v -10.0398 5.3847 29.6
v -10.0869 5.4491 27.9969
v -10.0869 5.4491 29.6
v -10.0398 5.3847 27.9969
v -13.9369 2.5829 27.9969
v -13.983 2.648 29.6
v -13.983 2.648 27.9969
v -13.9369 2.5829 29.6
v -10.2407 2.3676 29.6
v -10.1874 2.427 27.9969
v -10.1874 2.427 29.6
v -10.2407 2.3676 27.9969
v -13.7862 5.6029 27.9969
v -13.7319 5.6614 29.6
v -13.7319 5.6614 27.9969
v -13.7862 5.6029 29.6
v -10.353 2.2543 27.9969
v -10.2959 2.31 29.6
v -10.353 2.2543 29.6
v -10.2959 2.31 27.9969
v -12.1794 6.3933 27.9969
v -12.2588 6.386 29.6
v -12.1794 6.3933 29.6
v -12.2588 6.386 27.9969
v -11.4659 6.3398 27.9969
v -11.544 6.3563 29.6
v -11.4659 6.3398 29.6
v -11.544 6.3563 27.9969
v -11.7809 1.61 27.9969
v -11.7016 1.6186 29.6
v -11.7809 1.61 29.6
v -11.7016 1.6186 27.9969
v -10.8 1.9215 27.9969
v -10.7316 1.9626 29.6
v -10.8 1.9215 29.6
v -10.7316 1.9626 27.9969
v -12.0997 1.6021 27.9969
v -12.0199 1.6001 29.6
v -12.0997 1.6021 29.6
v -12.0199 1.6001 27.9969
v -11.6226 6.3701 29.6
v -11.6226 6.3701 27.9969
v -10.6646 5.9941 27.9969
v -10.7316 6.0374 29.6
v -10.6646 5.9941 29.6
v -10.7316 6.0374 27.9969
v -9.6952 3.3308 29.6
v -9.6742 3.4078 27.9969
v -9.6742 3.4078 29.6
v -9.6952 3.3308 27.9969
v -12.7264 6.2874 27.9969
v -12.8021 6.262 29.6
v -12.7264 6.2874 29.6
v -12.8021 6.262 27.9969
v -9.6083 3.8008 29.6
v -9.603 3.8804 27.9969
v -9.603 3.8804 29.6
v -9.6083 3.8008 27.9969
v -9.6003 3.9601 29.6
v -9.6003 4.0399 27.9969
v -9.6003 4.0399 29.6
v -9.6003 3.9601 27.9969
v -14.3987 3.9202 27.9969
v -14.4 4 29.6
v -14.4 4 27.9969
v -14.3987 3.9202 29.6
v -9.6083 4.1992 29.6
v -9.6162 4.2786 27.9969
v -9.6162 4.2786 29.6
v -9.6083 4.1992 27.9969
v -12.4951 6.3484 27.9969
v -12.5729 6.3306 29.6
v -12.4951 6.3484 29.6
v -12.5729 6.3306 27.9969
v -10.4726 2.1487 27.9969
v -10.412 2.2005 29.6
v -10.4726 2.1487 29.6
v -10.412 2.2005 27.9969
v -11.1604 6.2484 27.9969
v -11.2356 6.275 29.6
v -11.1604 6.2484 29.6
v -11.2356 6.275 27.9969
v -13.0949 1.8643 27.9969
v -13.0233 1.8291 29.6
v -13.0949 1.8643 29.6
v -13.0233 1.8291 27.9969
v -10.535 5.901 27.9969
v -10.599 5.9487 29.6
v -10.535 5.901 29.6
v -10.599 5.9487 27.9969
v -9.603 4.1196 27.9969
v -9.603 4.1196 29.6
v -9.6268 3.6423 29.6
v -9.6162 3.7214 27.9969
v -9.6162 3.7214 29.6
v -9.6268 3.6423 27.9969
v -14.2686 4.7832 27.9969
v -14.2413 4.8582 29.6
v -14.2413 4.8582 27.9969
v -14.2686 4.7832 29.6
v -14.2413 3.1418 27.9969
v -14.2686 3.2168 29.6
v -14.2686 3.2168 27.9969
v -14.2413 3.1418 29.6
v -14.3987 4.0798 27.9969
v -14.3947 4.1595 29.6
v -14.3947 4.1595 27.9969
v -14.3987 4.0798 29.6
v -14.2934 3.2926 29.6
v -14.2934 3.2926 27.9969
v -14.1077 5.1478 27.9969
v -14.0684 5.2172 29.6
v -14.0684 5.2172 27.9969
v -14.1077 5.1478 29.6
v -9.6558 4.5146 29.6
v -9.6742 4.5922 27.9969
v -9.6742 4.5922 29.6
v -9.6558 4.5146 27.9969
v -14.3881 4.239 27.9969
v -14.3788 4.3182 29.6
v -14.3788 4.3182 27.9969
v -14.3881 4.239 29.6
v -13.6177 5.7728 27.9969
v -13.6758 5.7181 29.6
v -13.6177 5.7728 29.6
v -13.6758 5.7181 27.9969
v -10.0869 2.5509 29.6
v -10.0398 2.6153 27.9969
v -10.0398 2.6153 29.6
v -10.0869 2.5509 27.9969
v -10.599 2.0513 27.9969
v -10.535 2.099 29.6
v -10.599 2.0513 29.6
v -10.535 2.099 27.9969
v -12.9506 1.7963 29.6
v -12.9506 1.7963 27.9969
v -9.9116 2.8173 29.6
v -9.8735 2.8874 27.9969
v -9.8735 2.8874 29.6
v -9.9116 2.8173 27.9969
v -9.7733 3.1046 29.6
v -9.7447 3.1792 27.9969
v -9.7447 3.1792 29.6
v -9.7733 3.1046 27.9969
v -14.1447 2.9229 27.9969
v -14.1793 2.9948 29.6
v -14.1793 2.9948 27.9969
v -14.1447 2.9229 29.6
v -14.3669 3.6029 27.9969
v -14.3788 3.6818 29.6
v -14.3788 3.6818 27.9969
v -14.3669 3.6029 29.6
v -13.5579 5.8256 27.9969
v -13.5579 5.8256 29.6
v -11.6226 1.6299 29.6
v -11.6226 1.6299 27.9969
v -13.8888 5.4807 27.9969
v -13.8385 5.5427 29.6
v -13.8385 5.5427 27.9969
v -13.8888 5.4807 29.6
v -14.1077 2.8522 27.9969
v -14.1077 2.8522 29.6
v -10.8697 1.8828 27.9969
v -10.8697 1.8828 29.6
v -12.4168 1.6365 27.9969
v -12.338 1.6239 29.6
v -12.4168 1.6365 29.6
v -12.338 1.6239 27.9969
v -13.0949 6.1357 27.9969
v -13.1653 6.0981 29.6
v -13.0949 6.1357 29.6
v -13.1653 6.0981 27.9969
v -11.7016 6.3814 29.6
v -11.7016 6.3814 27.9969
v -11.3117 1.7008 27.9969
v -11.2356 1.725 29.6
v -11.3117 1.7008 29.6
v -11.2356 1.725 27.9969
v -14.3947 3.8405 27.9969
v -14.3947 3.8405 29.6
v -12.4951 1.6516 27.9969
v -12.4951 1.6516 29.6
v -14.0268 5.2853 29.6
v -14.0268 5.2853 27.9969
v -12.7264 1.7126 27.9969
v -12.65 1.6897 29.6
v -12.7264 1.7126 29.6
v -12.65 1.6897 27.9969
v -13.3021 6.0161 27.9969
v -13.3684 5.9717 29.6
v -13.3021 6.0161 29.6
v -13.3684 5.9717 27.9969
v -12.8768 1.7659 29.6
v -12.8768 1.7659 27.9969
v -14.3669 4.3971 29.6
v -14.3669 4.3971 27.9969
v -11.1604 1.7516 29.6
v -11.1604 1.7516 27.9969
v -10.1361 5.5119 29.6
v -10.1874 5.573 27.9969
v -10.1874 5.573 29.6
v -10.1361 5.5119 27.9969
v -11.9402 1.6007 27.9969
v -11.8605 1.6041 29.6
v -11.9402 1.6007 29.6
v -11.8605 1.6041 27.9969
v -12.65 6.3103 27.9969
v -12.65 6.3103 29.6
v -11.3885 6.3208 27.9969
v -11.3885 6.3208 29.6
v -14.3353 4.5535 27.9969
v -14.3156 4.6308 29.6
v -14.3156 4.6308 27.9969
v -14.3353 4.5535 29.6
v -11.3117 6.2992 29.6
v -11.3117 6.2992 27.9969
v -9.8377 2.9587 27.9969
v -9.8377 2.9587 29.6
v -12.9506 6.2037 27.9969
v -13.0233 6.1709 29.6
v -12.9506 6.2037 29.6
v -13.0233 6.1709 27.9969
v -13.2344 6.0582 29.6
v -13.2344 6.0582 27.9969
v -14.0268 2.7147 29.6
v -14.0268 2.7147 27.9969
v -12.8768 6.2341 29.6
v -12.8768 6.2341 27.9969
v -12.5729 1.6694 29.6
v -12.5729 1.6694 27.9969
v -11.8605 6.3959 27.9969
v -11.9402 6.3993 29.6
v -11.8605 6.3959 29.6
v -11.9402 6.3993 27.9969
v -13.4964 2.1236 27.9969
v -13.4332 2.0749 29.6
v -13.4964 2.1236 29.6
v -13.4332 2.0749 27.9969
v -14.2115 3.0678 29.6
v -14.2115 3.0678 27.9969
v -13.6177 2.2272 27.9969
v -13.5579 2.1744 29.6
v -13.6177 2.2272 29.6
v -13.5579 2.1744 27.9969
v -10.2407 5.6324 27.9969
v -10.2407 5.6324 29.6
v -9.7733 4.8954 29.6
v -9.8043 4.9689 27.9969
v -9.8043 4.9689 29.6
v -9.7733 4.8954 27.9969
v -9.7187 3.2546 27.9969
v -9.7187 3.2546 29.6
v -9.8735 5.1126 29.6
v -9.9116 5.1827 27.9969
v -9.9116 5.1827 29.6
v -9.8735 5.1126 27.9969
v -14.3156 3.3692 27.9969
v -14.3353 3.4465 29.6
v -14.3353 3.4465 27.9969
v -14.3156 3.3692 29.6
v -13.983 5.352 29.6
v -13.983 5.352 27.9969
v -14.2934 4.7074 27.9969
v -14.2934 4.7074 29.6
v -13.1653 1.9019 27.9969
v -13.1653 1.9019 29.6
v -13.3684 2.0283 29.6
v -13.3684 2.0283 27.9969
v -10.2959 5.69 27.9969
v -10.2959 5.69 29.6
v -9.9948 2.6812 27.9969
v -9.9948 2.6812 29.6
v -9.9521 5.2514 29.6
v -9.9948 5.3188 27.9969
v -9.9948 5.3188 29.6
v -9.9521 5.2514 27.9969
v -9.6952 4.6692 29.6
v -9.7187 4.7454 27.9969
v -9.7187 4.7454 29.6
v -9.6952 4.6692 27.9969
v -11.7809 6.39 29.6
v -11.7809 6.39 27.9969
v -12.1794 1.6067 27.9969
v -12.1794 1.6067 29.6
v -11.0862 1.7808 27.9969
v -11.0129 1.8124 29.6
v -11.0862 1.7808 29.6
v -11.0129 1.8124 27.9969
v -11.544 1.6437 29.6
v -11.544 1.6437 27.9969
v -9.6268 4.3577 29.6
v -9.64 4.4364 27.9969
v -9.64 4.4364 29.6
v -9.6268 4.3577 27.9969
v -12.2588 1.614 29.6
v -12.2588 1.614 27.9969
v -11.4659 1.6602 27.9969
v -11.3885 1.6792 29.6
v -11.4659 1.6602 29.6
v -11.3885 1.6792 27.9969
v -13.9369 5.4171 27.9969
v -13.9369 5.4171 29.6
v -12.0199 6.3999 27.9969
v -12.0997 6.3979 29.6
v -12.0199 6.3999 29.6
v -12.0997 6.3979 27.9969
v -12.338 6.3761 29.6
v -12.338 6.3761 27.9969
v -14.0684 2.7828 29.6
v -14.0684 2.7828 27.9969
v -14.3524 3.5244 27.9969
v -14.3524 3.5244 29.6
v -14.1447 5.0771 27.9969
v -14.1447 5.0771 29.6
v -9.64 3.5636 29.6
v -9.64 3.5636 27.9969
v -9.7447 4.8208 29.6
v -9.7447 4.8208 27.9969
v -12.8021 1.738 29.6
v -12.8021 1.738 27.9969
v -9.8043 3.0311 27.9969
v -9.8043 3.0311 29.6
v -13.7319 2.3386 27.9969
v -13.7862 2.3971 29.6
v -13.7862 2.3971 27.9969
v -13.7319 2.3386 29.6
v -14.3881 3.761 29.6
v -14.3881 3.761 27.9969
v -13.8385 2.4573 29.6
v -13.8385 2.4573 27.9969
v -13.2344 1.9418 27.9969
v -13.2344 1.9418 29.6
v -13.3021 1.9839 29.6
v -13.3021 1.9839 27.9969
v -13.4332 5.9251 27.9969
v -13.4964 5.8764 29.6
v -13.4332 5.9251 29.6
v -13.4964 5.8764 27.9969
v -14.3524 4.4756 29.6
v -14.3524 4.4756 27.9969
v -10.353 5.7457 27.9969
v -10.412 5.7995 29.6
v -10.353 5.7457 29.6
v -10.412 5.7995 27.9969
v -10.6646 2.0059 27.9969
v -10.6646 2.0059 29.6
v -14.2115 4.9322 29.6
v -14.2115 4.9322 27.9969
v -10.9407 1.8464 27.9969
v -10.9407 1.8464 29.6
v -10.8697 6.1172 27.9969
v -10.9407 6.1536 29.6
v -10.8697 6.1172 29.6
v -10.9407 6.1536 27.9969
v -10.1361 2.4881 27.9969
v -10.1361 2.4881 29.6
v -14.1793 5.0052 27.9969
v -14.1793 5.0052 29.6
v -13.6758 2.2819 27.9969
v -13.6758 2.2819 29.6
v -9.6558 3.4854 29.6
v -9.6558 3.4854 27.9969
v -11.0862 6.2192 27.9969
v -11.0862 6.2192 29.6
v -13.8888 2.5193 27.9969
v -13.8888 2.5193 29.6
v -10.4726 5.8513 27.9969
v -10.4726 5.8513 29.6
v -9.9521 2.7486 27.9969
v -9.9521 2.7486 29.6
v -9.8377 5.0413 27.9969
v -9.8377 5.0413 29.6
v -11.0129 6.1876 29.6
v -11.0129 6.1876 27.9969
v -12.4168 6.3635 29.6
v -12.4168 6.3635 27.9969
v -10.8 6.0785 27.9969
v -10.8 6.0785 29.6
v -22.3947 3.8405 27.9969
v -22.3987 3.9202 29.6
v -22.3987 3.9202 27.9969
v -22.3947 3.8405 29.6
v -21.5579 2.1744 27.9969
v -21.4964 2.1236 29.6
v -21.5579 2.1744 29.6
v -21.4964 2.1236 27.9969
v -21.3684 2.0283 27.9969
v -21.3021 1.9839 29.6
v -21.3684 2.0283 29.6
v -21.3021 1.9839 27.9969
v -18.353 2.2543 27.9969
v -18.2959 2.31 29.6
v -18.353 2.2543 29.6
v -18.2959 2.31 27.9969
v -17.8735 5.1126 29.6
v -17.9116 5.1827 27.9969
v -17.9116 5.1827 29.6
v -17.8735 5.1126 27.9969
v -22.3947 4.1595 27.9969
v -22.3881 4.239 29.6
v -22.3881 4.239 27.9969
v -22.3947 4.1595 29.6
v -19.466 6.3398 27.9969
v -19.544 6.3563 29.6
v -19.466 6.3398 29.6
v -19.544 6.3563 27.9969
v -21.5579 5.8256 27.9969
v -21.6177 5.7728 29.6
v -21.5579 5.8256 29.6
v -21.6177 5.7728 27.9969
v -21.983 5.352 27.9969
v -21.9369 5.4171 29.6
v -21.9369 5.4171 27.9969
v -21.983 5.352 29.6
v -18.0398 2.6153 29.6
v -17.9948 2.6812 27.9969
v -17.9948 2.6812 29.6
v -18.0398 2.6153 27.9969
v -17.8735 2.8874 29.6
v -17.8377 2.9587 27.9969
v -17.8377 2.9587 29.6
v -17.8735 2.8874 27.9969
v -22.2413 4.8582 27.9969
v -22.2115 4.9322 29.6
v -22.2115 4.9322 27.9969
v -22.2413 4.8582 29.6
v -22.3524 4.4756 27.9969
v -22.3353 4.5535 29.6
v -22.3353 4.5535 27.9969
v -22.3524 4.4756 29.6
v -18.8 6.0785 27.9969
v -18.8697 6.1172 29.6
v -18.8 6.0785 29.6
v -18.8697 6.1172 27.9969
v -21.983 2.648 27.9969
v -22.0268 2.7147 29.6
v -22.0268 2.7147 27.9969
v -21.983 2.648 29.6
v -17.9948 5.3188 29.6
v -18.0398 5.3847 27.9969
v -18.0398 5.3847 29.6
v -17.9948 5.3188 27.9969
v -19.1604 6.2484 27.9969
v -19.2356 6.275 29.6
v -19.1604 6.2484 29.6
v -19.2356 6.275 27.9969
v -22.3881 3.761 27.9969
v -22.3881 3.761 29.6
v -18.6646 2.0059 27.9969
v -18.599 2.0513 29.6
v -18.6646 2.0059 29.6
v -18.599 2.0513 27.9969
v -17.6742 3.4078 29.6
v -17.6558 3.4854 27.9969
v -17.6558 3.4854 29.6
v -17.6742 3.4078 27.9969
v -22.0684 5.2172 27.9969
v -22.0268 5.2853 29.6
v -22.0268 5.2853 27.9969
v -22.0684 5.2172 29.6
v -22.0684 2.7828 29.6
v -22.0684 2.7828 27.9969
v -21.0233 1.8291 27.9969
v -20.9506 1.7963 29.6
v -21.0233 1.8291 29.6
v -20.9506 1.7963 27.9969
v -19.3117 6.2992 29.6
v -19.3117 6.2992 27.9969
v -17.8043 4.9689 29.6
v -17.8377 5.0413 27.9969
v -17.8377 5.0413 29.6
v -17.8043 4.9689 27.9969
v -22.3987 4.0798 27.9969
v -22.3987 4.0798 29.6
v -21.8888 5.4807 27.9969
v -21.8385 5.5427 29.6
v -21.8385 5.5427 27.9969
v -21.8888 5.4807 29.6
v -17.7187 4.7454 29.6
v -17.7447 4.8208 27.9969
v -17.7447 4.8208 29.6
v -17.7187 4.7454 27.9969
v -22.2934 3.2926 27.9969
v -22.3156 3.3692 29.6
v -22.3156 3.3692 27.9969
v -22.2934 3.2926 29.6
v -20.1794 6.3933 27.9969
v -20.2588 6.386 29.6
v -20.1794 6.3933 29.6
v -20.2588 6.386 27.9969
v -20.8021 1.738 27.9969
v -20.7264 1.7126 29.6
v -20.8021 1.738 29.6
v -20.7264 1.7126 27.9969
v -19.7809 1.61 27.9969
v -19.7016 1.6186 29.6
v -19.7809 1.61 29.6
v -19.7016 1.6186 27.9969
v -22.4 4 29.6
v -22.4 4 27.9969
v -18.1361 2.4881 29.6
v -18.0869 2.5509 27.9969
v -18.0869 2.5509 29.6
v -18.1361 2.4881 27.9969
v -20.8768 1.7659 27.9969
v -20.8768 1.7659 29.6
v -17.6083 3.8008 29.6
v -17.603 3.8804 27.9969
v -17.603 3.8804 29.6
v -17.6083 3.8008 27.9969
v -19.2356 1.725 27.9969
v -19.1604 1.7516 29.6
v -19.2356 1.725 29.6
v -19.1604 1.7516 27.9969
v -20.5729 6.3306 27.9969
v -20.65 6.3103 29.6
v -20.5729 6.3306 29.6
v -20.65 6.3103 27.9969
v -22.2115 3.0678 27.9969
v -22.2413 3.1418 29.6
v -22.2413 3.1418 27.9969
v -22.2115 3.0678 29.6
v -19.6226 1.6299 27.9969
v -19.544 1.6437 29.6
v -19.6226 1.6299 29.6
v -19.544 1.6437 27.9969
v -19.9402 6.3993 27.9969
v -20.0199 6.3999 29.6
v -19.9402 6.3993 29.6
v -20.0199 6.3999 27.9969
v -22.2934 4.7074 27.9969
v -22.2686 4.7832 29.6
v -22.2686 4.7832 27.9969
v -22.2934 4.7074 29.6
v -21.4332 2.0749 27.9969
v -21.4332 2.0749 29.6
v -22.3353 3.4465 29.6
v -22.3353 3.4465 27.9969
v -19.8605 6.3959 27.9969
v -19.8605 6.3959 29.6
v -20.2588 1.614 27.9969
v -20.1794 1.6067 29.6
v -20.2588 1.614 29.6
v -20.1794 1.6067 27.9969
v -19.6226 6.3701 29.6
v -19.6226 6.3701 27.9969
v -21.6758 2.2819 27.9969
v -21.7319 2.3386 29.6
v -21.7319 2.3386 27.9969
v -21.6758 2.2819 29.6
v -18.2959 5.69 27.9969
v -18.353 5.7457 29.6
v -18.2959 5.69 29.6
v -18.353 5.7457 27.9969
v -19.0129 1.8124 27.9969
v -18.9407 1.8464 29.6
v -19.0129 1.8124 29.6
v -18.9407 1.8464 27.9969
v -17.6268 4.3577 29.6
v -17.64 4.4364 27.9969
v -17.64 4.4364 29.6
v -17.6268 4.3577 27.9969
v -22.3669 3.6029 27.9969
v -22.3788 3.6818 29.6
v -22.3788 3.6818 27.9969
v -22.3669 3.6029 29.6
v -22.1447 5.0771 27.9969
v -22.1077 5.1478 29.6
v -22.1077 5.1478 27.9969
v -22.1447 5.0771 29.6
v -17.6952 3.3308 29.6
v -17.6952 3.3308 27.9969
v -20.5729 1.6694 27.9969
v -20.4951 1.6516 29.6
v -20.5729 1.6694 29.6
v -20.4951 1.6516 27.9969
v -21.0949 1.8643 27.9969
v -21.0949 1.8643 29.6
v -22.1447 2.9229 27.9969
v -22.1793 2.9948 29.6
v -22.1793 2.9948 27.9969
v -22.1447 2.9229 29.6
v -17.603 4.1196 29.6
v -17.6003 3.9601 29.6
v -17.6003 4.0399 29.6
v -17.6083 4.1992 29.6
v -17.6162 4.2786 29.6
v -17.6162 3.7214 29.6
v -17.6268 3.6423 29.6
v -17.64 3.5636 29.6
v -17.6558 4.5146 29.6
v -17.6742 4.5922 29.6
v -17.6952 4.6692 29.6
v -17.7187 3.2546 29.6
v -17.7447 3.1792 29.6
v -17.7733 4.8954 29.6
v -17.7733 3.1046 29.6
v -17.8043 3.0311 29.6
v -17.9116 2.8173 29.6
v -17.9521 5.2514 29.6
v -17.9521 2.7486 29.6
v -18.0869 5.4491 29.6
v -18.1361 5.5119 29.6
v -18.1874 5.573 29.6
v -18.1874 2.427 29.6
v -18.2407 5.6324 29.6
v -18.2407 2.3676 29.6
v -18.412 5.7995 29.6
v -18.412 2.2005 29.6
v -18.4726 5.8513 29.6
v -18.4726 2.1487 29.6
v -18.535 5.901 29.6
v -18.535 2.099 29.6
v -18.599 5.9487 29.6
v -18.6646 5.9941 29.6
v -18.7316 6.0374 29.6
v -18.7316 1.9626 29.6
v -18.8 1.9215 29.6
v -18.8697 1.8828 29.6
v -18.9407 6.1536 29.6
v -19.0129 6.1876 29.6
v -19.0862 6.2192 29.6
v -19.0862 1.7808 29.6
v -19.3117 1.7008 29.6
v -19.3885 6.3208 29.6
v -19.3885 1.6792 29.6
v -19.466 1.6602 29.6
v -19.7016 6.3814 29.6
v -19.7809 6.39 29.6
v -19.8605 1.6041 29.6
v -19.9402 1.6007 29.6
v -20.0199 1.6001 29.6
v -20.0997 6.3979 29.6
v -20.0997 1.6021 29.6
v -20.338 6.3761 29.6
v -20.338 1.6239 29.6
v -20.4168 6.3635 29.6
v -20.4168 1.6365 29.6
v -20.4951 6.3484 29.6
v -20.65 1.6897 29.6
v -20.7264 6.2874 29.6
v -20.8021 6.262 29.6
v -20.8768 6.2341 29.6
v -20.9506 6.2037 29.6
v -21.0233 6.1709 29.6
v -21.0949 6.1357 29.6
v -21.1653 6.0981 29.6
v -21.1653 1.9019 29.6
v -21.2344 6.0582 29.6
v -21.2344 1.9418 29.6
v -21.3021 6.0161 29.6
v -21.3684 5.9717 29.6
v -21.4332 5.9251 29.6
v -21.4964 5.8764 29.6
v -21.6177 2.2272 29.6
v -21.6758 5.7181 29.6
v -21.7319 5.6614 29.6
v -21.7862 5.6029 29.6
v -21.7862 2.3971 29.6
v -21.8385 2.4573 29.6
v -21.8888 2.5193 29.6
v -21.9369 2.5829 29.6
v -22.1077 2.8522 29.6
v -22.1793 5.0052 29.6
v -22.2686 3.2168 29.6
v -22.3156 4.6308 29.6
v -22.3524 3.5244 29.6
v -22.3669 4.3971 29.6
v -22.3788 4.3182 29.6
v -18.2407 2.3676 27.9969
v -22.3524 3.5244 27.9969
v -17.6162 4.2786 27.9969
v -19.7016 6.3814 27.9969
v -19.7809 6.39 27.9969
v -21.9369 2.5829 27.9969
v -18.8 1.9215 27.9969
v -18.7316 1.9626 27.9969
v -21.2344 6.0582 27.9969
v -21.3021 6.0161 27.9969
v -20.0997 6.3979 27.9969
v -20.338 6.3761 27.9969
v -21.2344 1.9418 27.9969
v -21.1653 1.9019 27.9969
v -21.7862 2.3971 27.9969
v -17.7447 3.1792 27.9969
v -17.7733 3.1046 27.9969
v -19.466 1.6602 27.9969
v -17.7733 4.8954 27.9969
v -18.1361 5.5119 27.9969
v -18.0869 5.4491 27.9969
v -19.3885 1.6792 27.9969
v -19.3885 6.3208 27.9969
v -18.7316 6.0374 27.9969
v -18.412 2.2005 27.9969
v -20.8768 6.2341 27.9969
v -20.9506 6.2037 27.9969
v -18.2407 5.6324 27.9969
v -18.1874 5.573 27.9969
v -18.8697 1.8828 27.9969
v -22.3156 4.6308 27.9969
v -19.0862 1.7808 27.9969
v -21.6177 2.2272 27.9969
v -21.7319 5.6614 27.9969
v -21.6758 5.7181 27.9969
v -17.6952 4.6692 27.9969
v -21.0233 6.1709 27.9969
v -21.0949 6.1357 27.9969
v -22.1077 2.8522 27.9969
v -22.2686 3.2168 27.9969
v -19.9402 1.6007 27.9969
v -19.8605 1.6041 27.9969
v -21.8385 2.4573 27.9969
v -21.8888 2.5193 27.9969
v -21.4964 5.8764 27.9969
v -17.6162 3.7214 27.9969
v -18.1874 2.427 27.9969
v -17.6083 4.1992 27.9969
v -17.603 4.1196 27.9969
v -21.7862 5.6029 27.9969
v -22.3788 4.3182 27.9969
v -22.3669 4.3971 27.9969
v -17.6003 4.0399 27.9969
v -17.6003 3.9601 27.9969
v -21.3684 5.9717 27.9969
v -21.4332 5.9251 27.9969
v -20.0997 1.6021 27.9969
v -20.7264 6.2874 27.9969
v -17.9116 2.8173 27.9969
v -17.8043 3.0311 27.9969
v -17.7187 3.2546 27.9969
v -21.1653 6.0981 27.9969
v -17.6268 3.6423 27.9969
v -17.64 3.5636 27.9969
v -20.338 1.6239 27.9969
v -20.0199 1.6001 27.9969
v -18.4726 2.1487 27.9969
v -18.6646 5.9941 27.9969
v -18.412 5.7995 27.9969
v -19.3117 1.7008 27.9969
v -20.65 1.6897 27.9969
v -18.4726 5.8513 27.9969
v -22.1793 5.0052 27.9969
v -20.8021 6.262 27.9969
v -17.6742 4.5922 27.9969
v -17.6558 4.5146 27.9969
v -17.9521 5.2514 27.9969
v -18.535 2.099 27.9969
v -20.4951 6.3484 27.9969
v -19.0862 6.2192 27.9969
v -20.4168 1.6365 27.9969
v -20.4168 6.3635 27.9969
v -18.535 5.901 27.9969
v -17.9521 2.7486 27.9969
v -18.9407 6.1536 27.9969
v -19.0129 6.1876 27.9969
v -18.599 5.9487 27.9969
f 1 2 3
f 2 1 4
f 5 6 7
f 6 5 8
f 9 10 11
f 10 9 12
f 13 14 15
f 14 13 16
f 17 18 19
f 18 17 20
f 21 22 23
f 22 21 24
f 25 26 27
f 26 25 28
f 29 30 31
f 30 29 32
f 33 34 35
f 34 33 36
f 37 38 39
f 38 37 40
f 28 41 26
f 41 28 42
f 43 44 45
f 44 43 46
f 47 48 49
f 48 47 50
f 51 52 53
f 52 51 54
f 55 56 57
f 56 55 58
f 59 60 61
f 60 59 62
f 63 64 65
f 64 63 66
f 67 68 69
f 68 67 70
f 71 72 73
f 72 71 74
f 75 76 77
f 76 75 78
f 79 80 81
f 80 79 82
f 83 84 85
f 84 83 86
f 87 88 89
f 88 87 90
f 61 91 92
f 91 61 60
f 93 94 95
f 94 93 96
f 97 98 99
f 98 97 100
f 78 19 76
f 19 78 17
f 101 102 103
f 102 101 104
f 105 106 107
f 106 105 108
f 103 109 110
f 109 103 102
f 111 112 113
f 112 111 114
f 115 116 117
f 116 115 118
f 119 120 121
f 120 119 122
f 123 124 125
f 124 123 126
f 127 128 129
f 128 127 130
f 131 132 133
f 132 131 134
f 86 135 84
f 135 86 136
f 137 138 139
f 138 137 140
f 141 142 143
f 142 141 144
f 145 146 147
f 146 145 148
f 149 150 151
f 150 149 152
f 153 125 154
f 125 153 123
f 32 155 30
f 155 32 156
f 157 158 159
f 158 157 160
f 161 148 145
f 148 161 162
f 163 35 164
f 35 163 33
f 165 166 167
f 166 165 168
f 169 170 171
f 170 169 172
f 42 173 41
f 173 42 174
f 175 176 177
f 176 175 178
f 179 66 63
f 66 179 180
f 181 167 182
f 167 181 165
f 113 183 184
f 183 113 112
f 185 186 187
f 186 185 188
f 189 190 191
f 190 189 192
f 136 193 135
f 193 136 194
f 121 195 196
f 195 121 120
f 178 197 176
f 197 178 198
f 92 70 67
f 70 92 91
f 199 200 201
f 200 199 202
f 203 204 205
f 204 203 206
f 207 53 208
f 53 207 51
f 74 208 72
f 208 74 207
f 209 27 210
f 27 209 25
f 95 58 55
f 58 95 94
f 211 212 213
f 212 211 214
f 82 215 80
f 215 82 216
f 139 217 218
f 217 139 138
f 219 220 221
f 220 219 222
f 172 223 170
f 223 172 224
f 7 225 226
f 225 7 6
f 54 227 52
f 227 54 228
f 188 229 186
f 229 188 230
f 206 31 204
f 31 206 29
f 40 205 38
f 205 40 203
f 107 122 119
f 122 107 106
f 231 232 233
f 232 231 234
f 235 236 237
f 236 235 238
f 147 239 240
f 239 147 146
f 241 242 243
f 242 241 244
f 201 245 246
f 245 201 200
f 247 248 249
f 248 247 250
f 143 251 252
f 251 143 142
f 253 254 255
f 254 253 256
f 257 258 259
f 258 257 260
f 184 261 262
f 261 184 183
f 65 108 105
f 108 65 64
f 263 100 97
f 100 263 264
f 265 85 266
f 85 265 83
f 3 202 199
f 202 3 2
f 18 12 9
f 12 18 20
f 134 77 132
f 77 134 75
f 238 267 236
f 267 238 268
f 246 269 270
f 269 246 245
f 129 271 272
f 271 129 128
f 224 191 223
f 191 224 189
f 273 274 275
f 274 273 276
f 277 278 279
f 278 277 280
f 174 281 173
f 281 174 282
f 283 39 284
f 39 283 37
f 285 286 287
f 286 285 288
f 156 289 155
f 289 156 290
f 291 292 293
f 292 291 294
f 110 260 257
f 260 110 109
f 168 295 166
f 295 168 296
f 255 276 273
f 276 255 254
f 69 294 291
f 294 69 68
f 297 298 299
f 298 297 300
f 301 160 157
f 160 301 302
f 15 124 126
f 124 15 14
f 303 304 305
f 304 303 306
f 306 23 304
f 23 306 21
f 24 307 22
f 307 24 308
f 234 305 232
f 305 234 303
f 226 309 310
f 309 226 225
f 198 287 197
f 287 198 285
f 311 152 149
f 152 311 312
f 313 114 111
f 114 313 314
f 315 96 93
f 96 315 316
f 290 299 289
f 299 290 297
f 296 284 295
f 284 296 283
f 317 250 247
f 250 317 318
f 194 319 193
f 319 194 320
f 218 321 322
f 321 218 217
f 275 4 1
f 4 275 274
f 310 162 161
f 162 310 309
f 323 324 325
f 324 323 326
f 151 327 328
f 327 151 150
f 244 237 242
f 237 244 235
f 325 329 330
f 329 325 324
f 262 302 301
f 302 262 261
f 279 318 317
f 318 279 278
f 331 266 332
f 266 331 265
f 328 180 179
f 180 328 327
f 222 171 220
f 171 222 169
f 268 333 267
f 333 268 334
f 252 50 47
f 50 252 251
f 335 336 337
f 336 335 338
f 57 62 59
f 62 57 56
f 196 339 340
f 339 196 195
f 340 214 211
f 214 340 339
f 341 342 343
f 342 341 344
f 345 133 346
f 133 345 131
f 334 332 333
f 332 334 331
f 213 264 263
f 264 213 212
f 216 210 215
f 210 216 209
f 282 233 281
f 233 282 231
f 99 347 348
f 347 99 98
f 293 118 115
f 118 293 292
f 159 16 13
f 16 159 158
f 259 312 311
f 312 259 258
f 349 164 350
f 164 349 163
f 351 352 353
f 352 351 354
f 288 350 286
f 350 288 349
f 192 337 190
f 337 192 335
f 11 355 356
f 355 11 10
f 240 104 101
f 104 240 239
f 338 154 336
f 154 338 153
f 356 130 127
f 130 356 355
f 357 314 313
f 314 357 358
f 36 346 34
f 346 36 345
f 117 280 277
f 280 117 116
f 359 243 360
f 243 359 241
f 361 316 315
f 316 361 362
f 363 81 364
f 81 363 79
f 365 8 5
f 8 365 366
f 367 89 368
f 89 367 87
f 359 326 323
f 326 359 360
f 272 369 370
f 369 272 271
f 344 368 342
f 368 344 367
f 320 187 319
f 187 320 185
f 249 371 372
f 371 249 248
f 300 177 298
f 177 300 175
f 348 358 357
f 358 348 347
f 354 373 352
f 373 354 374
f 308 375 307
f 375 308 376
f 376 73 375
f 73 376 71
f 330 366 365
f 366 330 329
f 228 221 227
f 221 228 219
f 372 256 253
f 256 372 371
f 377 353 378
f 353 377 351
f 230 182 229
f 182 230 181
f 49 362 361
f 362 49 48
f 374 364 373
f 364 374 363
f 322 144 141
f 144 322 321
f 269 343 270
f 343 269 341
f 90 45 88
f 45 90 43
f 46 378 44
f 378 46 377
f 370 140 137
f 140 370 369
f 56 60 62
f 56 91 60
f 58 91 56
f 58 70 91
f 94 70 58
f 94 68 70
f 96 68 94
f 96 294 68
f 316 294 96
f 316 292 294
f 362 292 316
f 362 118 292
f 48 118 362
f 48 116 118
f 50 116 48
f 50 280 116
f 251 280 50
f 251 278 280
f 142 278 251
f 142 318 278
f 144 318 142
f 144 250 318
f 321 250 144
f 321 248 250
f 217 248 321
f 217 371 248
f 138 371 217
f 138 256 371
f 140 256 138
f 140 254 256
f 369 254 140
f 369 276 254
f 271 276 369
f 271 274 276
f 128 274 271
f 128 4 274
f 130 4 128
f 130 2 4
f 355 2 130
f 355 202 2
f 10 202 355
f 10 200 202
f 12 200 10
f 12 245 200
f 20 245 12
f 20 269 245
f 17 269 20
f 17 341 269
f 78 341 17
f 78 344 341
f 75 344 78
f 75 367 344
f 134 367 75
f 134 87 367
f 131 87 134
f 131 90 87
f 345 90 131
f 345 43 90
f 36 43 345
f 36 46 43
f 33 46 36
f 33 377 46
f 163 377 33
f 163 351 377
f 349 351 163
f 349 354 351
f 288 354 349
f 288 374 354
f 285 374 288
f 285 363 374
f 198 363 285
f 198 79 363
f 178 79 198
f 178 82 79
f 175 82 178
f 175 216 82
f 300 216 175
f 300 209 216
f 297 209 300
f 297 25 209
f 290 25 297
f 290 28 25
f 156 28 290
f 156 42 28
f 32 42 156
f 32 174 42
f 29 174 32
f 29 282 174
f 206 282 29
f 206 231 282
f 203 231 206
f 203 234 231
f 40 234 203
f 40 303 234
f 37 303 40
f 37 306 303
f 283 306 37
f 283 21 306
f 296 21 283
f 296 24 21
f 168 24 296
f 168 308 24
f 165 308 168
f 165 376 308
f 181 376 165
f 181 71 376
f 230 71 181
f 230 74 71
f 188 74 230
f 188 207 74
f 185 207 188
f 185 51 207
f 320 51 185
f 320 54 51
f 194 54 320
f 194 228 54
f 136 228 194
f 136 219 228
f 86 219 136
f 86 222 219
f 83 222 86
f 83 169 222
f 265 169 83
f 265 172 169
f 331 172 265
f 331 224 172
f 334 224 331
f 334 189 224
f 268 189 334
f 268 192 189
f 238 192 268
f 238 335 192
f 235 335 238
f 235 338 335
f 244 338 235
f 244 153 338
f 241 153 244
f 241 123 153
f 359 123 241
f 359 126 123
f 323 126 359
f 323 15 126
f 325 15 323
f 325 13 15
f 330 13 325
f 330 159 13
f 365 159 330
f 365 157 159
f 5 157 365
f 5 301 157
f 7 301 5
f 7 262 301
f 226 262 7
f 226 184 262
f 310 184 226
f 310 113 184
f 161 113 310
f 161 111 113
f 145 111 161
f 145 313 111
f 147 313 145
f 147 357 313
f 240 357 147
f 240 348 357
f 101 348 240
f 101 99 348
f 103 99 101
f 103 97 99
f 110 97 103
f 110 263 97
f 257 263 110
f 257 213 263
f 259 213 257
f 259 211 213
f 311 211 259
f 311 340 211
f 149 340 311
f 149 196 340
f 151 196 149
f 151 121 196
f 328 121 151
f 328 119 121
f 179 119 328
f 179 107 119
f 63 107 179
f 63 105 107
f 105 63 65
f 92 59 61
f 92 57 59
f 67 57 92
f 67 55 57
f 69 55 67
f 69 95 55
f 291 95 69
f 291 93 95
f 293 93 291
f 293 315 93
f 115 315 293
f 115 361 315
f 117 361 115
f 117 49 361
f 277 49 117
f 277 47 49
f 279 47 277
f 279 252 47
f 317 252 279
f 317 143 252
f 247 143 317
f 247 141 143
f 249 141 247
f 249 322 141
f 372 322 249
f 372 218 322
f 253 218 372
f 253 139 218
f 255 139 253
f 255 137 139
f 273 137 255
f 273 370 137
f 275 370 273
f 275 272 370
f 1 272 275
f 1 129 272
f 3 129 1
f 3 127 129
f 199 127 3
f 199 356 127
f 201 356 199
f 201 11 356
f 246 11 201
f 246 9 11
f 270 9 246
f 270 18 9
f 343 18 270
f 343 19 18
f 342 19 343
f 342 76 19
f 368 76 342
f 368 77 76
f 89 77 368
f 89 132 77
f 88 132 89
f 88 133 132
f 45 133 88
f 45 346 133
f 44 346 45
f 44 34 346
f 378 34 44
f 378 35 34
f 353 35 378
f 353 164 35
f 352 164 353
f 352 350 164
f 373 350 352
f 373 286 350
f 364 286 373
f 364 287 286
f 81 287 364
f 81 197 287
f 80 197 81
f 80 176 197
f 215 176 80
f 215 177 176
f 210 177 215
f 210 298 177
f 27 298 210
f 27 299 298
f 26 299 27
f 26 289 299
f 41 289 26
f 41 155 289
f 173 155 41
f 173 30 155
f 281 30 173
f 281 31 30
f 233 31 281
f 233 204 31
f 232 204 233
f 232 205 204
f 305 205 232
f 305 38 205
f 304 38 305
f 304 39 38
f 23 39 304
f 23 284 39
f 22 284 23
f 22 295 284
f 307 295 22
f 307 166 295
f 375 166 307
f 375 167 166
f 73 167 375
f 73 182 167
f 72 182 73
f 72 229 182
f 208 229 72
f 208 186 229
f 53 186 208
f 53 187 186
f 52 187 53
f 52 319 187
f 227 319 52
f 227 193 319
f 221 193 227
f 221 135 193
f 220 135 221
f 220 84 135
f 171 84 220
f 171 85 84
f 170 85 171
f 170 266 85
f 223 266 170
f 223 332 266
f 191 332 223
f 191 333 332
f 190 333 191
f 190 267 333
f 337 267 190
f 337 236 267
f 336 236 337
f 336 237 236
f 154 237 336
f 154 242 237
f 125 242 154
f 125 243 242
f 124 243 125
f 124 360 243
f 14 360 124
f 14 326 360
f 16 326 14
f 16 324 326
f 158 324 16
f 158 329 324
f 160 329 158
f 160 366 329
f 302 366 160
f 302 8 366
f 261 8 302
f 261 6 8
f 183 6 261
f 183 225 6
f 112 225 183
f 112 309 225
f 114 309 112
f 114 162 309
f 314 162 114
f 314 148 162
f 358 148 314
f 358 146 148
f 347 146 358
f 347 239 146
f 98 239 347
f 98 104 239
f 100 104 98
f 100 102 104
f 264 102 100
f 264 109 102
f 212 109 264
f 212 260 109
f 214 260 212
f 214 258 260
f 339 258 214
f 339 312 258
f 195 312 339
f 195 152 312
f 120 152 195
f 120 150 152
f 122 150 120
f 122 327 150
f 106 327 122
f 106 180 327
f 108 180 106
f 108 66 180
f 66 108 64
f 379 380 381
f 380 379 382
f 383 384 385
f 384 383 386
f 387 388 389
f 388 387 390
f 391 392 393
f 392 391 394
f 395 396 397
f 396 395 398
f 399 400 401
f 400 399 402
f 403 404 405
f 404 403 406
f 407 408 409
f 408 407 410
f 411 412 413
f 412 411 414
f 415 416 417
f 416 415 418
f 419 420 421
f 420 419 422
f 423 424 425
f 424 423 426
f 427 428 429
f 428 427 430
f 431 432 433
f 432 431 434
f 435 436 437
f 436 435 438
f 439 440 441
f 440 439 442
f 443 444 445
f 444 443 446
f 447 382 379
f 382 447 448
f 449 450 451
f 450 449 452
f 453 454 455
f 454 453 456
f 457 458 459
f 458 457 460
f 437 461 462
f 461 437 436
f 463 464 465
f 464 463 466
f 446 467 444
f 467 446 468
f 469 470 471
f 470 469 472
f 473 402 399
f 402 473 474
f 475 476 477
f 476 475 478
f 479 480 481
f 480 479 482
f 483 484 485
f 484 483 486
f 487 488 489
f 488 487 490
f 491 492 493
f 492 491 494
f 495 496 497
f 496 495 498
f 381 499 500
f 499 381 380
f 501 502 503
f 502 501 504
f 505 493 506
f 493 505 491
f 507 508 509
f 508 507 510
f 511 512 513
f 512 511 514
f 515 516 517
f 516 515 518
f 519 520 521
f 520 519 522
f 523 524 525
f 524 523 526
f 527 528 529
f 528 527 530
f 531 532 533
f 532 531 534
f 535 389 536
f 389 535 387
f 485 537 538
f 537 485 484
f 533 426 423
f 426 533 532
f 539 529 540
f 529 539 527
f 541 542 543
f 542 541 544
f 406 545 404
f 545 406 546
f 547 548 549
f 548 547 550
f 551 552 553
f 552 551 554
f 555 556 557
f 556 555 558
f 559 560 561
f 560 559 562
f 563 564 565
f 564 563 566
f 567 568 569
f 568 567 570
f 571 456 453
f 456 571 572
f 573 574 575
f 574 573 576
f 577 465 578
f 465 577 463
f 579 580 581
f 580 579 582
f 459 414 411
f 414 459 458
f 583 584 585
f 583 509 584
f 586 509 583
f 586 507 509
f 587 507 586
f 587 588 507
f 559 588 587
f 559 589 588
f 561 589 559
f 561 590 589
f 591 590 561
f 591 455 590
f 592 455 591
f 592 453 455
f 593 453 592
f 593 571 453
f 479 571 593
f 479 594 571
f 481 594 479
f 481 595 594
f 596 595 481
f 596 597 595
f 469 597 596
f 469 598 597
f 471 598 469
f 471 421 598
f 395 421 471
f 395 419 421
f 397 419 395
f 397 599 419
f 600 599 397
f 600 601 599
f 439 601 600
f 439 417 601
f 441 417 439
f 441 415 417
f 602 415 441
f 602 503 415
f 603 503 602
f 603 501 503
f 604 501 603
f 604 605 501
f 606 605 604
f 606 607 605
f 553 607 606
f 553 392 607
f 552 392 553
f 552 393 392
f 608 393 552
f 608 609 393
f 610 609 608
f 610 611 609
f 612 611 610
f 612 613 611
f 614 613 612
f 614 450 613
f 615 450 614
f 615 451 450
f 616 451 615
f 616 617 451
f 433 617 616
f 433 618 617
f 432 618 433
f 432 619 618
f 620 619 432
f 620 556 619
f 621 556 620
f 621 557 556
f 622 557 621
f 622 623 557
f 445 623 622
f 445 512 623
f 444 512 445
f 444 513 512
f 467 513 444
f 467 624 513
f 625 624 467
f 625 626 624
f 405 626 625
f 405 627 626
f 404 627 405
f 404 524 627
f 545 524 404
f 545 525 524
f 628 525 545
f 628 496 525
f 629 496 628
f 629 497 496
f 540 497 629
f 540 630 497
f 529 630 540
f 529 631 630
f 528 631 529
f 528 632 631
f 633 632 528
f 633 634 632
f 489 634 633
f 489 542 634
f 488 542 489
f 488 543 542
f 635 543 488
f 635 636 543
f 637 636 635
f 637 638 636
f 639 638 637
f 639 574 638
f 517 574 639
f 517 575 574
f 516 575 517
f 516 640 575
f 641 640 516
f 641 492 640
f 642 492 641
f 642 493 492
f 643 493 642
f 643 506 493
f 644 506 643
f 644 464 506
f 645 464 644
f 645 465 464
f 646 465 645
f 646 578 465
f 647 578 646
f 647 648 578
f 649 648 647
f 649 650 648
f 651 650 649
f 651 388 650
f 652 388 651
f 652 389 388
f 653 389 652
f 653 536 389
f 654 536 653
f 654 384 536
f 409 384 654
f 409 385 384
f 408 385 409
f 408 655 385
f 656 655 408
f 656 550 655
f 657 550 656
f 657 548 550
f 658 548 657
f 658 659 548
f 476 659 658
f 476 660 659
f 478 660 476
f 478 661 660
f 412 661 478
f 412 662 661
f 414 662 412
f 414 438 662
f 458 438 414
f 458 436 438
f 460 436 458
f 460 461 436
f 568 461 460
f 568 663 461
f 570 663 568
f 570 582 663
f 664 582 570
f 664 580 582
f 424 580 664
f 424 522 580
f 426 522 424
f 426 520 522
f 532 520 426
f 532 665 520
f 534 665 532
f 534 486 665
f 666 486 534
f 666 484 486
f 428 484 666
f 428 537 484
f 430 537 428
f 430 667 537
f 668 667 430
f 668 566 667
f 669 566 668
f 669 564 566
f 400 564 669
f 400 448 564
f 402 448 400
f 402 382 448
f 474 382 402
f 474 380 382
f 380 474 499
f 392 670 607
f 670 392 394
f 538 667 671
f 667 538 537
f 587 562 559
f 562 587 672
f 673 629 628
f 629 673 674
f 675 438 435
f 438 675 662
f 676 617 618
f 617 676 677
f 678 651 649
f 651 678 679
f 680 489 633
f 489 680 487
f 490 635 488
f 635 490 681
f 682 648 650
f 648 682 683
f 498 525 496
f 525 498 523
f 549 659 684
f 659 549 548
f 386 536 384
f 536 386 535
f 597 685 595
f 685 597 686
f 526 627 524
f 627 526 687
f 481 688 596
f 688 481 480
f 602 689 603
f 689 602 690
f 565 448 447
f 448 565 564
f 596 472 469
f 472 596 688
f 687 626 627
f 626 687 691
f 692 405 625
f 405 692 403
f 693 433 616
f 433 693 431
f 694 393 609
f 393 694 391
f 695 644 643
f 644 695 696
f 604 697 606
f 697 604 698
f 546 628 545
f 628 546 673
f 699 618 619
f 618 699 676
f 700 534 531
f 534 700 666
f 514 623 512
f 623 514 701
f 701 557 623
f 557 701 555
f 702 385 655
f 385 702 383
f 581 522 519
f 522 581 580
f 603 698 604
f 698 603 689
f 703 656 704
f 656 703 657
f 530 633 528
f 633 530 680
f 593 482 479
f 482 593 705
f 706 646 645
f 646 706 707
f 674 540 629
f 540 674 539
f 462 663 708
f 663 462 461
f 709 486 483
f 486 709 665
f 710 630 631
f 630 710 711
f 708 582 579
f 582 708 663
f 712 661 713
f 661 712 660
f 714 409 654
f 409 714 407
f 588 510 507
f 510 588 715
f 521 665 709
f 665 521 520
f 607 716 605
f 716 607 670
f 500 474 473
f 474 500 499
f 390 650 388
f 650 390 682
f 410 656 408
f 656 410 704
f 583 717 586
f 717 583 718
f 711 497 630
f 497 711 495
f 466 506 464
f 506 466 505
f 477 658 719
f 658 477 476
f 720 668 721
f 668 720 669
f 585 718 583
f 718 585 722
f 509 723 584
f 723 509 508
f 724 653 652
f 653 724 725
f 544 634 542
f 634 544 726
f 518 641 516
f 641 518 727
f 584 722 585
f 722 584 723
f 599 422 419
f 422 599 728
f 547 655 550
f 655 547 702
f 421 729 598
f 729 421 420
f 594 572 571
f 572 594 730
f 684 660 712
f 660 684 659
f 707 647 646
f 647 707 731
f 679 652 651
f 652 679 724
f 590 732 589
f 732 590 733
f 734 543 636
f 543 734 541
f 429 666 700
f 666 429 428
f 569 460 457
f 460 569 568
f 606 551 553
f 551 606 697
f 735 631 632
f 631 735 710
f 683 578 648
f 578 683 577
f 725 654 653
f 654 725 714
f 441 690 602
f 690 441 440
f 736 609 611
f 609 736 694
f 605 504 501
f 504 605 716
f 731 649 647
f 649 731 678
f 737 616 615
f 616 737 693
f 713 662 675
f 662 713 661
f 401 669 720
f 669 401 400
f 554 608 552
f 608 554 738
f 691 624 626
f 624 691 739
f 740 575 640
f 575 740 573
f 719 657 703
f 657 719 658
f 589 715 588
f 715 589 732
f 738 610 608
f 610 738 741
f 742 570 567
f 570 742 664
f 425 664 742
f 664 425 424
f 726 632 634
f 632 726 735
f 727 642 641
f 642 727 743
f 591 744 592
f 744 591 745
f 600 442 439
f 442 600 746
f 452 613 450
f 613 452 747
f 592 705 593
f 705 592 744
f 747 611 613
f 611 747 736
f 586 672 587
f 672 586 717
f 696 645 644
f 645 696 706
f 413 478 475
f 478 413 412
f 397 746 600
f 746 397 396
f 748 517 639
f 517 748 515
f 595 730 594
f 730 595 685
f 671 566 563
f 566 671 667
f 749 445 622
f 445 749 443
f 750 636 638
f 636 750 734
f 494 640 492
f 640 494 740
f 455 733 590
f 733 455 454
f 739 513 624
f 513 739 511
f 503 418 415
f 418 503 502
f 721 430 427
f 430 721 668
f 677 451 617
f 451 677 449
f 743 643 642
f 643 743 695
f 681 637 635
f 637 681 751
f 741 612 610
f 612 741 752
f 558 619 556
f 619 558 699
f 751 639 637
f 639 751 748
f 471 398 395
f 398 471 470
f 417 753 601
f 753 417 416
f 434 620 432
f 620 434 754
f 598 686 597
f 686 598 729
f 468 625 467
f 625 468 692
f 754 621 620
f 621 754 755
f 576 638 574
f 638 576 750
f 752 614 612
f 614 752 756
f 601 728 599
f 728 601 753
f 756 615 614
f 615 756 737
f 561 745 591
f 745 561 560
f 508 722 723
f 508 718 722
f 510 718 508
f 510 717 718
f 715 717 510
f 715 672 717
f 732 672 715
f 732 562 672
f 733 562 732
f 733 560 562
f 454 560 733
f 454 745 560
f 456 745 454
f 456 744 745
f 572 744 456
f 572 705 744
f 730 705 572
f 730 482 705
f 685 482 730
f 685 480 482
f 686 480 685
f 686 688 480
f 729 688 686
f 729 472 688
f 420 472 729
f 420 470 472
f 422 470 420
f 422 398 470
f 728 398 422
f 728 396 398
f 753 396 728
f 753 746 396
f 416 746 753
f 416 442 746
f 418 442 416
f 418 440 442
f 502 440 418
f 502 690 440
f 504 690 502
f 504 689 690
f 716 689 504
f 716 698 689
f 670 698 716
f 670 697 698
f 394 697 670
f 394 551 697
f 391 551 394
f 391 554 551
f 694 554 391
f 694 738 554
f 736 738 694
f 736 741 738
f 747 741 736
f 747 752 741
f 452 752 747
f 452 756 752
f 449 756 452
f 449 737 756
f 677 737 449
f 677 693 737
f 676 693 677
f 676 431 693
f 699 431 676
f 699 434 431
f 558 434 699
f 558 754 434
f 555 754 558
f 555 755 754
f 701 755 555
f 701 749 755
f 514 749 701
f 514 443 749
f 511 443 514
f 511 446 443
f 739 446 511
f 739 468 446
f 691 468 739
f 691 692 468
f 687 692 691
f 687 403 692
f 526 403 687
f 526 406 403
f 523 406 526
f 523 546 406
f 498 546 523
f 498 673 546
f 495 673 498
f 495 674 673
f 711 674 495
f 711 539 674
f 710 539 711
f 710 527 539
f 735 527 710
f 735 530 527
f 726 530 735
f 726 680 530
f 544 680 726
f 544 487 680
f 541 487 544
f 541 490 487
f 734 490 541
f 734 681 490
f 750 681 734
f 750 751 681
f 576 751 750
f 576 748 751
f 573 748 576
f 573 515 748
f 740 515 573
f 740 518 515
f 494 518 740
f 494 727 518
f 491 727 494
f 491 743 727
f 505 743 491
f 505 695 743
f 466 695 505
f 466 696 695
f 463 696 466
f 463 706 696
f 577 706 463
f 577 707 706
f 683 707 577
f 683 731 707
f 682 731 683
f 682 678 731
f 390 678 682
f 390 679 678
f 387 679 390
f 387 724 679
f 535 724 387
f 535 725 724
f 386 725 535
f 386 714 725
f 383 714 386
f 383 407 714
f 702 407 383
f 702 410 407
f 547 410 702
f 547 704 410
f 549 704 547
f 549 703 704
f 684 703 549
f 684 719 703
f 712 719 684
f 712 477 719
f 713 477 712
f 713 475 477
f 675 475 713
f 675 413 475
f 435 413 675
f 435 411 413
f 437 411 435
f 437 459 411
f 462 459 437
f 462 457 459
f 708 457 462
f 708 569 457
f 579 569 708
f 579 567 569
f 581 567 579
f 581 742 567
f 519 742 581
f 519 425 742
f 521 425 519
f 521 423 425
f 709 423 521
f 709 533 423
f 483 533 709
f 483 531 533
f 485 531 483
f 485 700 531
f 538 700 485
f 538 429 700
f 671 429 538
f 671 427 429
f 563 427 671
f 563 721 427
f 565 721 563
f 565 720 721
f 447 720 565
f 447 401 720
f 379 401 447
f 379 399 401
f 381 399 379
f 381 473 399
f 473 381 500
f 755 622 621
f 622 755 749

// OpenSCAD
use <../../lib.scad>
use <../../p/1-16edge.scad>
use <58124s01.scad>
$fa=1; $fs=0.2;
function ldraw_lib__s__919s04(realsolid=false) = [
// 0 ~Electric Power Functions 9V Battery Box Connector
// 0 Name: s\919s04.dat
// 0 Author: Philippe Hurbain [Philo]
// 0 !LDRAW_ORG Subpart UPDATE 2010-02
// 0 !LICENSE Licensed under CC BY 2.0 and CC BY 4.0 : see CAreadme.txt
// 
// 0 BFC CERTIFY CW
  [0,"BFC","CERTIFY"],
  [0,"BFC","CW"],
// 
// 0 !HISTORY 2010-07-05 [PTadmin] Official Update 2010-02
// 
// 
// 1 16 -40 -70 0 0 0 1 0 1 0 -1 0 0 s\58124s01.dat
  [1,16,-40,-70,0,0,0,1,0,1,0,-1,0,0, ldraw_lib__s__58124s01(realsolid)],
// 2 24 -30 -70 -20 -20 -70 -20
  [2,24,-30,-70,-20,-20,-70,-20],
// 2 24 -60 -70 -20 -50 -70 -20
  [2,24,-60,-70,-20,-50,-70,-20],
// 2 24 -60 -70 20 -20 -70 20
  [2,24,-60,-70,20,-20,-70,20],
// 2 24 -20 -70 -20 -20 -70 20
  [2,24,-20,-70,-20,-20,-70,20],
// 2 24 -60 -70 -20 -60 -70 20
  [2,24,-60,-70,-20,-60,-70,20],
// 4 16 -50 -74 -26 -50 -74 -16 -30 -74 -16 -30 -74 -26
  [4,16,-50,-74,-26,-50,-74,-16,-30,-74,-16,-30,-74,-26],
// 2 24 -50 -74 -26 -30 -74 -26
  [2,24,-50,-74,-26,-30,-74,-26],
// 2 24 -50 -74 -26 -50 -74 -20
  [2,24,-50,-74,-26,-50,-74,-20],
// 2 24 -30 -74 -26 -30 -74 -20
  [2,24,-30,-74,-26,-30,-74,-20],
// 1 16 -30 -50 -20 0 -20 0 -20 0 0 0 0 -20 1-16edge.dat
  [1,16,-30,-50,-20,0,-20,0,-20,0,0,0,0,-20, ldraw_lib__1_16edge(realsolid)],
// 1 16 -50 -50 -20 0 -20 0 -20 0 0 0 0 -20 1-16edge.dat
  [1,16,-50,-50,-20,0,-20,0,-20,0,0,0,0,-20, ldraw_lib__1_16edge(realsolid)],
// 4 16 -30 -74 -26 -30 -74 -20 -30 -70 -20 -30 -68.48 -27.65
  [4,16,-30,-74,-26,-30,-74,-20,-30,-70,-20,-30,-68.48,-27.65],
// 4 16 -50 -68.48 -27.65 -50 -70 -20 -50 -74 -20 -50 -74 -26
  [4,16,-50,-68.48,-27.65,-50,-70,-20,-50,-74,-20,-50,-74,-26],
// 4 16 -30 -74 -26 -30 -68.48 -27.65 -50 -68.48 -27.65 -50 -74 -26
  [4,16,-30,-74,-26,-30,-68.48,-27.65,-50,-68.48,-27.65,-50,-74,-26],
// 2 24 -30 -68.48 -27.65 -50 -68.48 -27.65
  [2,24,-30,-68.48,-27.65,-50,-68.48,-27.65],
// 2 24 -30 -74 -26 -30 -68.48 -27.65
  [2,24,-30,-74,-26,-30,-68.48,-27.65],
// 2 24 -50 -68.48 -27.65 -50 -74 -26
  [2,24,-50,-68.48,-27.65,-50,-74,-26],
// 0
];
module ldraw_lib__s__919s04(step=0, col=false, unit=2/5, alt=false, line=0.2, solid=!$preview)
    makepoly(ldraw_lib__s__919s04(solid), step=step, col=col, unit=unit, alt=alt, line=line, solid=solid);
ldraw_lib__s__919s04(line=0.2);
